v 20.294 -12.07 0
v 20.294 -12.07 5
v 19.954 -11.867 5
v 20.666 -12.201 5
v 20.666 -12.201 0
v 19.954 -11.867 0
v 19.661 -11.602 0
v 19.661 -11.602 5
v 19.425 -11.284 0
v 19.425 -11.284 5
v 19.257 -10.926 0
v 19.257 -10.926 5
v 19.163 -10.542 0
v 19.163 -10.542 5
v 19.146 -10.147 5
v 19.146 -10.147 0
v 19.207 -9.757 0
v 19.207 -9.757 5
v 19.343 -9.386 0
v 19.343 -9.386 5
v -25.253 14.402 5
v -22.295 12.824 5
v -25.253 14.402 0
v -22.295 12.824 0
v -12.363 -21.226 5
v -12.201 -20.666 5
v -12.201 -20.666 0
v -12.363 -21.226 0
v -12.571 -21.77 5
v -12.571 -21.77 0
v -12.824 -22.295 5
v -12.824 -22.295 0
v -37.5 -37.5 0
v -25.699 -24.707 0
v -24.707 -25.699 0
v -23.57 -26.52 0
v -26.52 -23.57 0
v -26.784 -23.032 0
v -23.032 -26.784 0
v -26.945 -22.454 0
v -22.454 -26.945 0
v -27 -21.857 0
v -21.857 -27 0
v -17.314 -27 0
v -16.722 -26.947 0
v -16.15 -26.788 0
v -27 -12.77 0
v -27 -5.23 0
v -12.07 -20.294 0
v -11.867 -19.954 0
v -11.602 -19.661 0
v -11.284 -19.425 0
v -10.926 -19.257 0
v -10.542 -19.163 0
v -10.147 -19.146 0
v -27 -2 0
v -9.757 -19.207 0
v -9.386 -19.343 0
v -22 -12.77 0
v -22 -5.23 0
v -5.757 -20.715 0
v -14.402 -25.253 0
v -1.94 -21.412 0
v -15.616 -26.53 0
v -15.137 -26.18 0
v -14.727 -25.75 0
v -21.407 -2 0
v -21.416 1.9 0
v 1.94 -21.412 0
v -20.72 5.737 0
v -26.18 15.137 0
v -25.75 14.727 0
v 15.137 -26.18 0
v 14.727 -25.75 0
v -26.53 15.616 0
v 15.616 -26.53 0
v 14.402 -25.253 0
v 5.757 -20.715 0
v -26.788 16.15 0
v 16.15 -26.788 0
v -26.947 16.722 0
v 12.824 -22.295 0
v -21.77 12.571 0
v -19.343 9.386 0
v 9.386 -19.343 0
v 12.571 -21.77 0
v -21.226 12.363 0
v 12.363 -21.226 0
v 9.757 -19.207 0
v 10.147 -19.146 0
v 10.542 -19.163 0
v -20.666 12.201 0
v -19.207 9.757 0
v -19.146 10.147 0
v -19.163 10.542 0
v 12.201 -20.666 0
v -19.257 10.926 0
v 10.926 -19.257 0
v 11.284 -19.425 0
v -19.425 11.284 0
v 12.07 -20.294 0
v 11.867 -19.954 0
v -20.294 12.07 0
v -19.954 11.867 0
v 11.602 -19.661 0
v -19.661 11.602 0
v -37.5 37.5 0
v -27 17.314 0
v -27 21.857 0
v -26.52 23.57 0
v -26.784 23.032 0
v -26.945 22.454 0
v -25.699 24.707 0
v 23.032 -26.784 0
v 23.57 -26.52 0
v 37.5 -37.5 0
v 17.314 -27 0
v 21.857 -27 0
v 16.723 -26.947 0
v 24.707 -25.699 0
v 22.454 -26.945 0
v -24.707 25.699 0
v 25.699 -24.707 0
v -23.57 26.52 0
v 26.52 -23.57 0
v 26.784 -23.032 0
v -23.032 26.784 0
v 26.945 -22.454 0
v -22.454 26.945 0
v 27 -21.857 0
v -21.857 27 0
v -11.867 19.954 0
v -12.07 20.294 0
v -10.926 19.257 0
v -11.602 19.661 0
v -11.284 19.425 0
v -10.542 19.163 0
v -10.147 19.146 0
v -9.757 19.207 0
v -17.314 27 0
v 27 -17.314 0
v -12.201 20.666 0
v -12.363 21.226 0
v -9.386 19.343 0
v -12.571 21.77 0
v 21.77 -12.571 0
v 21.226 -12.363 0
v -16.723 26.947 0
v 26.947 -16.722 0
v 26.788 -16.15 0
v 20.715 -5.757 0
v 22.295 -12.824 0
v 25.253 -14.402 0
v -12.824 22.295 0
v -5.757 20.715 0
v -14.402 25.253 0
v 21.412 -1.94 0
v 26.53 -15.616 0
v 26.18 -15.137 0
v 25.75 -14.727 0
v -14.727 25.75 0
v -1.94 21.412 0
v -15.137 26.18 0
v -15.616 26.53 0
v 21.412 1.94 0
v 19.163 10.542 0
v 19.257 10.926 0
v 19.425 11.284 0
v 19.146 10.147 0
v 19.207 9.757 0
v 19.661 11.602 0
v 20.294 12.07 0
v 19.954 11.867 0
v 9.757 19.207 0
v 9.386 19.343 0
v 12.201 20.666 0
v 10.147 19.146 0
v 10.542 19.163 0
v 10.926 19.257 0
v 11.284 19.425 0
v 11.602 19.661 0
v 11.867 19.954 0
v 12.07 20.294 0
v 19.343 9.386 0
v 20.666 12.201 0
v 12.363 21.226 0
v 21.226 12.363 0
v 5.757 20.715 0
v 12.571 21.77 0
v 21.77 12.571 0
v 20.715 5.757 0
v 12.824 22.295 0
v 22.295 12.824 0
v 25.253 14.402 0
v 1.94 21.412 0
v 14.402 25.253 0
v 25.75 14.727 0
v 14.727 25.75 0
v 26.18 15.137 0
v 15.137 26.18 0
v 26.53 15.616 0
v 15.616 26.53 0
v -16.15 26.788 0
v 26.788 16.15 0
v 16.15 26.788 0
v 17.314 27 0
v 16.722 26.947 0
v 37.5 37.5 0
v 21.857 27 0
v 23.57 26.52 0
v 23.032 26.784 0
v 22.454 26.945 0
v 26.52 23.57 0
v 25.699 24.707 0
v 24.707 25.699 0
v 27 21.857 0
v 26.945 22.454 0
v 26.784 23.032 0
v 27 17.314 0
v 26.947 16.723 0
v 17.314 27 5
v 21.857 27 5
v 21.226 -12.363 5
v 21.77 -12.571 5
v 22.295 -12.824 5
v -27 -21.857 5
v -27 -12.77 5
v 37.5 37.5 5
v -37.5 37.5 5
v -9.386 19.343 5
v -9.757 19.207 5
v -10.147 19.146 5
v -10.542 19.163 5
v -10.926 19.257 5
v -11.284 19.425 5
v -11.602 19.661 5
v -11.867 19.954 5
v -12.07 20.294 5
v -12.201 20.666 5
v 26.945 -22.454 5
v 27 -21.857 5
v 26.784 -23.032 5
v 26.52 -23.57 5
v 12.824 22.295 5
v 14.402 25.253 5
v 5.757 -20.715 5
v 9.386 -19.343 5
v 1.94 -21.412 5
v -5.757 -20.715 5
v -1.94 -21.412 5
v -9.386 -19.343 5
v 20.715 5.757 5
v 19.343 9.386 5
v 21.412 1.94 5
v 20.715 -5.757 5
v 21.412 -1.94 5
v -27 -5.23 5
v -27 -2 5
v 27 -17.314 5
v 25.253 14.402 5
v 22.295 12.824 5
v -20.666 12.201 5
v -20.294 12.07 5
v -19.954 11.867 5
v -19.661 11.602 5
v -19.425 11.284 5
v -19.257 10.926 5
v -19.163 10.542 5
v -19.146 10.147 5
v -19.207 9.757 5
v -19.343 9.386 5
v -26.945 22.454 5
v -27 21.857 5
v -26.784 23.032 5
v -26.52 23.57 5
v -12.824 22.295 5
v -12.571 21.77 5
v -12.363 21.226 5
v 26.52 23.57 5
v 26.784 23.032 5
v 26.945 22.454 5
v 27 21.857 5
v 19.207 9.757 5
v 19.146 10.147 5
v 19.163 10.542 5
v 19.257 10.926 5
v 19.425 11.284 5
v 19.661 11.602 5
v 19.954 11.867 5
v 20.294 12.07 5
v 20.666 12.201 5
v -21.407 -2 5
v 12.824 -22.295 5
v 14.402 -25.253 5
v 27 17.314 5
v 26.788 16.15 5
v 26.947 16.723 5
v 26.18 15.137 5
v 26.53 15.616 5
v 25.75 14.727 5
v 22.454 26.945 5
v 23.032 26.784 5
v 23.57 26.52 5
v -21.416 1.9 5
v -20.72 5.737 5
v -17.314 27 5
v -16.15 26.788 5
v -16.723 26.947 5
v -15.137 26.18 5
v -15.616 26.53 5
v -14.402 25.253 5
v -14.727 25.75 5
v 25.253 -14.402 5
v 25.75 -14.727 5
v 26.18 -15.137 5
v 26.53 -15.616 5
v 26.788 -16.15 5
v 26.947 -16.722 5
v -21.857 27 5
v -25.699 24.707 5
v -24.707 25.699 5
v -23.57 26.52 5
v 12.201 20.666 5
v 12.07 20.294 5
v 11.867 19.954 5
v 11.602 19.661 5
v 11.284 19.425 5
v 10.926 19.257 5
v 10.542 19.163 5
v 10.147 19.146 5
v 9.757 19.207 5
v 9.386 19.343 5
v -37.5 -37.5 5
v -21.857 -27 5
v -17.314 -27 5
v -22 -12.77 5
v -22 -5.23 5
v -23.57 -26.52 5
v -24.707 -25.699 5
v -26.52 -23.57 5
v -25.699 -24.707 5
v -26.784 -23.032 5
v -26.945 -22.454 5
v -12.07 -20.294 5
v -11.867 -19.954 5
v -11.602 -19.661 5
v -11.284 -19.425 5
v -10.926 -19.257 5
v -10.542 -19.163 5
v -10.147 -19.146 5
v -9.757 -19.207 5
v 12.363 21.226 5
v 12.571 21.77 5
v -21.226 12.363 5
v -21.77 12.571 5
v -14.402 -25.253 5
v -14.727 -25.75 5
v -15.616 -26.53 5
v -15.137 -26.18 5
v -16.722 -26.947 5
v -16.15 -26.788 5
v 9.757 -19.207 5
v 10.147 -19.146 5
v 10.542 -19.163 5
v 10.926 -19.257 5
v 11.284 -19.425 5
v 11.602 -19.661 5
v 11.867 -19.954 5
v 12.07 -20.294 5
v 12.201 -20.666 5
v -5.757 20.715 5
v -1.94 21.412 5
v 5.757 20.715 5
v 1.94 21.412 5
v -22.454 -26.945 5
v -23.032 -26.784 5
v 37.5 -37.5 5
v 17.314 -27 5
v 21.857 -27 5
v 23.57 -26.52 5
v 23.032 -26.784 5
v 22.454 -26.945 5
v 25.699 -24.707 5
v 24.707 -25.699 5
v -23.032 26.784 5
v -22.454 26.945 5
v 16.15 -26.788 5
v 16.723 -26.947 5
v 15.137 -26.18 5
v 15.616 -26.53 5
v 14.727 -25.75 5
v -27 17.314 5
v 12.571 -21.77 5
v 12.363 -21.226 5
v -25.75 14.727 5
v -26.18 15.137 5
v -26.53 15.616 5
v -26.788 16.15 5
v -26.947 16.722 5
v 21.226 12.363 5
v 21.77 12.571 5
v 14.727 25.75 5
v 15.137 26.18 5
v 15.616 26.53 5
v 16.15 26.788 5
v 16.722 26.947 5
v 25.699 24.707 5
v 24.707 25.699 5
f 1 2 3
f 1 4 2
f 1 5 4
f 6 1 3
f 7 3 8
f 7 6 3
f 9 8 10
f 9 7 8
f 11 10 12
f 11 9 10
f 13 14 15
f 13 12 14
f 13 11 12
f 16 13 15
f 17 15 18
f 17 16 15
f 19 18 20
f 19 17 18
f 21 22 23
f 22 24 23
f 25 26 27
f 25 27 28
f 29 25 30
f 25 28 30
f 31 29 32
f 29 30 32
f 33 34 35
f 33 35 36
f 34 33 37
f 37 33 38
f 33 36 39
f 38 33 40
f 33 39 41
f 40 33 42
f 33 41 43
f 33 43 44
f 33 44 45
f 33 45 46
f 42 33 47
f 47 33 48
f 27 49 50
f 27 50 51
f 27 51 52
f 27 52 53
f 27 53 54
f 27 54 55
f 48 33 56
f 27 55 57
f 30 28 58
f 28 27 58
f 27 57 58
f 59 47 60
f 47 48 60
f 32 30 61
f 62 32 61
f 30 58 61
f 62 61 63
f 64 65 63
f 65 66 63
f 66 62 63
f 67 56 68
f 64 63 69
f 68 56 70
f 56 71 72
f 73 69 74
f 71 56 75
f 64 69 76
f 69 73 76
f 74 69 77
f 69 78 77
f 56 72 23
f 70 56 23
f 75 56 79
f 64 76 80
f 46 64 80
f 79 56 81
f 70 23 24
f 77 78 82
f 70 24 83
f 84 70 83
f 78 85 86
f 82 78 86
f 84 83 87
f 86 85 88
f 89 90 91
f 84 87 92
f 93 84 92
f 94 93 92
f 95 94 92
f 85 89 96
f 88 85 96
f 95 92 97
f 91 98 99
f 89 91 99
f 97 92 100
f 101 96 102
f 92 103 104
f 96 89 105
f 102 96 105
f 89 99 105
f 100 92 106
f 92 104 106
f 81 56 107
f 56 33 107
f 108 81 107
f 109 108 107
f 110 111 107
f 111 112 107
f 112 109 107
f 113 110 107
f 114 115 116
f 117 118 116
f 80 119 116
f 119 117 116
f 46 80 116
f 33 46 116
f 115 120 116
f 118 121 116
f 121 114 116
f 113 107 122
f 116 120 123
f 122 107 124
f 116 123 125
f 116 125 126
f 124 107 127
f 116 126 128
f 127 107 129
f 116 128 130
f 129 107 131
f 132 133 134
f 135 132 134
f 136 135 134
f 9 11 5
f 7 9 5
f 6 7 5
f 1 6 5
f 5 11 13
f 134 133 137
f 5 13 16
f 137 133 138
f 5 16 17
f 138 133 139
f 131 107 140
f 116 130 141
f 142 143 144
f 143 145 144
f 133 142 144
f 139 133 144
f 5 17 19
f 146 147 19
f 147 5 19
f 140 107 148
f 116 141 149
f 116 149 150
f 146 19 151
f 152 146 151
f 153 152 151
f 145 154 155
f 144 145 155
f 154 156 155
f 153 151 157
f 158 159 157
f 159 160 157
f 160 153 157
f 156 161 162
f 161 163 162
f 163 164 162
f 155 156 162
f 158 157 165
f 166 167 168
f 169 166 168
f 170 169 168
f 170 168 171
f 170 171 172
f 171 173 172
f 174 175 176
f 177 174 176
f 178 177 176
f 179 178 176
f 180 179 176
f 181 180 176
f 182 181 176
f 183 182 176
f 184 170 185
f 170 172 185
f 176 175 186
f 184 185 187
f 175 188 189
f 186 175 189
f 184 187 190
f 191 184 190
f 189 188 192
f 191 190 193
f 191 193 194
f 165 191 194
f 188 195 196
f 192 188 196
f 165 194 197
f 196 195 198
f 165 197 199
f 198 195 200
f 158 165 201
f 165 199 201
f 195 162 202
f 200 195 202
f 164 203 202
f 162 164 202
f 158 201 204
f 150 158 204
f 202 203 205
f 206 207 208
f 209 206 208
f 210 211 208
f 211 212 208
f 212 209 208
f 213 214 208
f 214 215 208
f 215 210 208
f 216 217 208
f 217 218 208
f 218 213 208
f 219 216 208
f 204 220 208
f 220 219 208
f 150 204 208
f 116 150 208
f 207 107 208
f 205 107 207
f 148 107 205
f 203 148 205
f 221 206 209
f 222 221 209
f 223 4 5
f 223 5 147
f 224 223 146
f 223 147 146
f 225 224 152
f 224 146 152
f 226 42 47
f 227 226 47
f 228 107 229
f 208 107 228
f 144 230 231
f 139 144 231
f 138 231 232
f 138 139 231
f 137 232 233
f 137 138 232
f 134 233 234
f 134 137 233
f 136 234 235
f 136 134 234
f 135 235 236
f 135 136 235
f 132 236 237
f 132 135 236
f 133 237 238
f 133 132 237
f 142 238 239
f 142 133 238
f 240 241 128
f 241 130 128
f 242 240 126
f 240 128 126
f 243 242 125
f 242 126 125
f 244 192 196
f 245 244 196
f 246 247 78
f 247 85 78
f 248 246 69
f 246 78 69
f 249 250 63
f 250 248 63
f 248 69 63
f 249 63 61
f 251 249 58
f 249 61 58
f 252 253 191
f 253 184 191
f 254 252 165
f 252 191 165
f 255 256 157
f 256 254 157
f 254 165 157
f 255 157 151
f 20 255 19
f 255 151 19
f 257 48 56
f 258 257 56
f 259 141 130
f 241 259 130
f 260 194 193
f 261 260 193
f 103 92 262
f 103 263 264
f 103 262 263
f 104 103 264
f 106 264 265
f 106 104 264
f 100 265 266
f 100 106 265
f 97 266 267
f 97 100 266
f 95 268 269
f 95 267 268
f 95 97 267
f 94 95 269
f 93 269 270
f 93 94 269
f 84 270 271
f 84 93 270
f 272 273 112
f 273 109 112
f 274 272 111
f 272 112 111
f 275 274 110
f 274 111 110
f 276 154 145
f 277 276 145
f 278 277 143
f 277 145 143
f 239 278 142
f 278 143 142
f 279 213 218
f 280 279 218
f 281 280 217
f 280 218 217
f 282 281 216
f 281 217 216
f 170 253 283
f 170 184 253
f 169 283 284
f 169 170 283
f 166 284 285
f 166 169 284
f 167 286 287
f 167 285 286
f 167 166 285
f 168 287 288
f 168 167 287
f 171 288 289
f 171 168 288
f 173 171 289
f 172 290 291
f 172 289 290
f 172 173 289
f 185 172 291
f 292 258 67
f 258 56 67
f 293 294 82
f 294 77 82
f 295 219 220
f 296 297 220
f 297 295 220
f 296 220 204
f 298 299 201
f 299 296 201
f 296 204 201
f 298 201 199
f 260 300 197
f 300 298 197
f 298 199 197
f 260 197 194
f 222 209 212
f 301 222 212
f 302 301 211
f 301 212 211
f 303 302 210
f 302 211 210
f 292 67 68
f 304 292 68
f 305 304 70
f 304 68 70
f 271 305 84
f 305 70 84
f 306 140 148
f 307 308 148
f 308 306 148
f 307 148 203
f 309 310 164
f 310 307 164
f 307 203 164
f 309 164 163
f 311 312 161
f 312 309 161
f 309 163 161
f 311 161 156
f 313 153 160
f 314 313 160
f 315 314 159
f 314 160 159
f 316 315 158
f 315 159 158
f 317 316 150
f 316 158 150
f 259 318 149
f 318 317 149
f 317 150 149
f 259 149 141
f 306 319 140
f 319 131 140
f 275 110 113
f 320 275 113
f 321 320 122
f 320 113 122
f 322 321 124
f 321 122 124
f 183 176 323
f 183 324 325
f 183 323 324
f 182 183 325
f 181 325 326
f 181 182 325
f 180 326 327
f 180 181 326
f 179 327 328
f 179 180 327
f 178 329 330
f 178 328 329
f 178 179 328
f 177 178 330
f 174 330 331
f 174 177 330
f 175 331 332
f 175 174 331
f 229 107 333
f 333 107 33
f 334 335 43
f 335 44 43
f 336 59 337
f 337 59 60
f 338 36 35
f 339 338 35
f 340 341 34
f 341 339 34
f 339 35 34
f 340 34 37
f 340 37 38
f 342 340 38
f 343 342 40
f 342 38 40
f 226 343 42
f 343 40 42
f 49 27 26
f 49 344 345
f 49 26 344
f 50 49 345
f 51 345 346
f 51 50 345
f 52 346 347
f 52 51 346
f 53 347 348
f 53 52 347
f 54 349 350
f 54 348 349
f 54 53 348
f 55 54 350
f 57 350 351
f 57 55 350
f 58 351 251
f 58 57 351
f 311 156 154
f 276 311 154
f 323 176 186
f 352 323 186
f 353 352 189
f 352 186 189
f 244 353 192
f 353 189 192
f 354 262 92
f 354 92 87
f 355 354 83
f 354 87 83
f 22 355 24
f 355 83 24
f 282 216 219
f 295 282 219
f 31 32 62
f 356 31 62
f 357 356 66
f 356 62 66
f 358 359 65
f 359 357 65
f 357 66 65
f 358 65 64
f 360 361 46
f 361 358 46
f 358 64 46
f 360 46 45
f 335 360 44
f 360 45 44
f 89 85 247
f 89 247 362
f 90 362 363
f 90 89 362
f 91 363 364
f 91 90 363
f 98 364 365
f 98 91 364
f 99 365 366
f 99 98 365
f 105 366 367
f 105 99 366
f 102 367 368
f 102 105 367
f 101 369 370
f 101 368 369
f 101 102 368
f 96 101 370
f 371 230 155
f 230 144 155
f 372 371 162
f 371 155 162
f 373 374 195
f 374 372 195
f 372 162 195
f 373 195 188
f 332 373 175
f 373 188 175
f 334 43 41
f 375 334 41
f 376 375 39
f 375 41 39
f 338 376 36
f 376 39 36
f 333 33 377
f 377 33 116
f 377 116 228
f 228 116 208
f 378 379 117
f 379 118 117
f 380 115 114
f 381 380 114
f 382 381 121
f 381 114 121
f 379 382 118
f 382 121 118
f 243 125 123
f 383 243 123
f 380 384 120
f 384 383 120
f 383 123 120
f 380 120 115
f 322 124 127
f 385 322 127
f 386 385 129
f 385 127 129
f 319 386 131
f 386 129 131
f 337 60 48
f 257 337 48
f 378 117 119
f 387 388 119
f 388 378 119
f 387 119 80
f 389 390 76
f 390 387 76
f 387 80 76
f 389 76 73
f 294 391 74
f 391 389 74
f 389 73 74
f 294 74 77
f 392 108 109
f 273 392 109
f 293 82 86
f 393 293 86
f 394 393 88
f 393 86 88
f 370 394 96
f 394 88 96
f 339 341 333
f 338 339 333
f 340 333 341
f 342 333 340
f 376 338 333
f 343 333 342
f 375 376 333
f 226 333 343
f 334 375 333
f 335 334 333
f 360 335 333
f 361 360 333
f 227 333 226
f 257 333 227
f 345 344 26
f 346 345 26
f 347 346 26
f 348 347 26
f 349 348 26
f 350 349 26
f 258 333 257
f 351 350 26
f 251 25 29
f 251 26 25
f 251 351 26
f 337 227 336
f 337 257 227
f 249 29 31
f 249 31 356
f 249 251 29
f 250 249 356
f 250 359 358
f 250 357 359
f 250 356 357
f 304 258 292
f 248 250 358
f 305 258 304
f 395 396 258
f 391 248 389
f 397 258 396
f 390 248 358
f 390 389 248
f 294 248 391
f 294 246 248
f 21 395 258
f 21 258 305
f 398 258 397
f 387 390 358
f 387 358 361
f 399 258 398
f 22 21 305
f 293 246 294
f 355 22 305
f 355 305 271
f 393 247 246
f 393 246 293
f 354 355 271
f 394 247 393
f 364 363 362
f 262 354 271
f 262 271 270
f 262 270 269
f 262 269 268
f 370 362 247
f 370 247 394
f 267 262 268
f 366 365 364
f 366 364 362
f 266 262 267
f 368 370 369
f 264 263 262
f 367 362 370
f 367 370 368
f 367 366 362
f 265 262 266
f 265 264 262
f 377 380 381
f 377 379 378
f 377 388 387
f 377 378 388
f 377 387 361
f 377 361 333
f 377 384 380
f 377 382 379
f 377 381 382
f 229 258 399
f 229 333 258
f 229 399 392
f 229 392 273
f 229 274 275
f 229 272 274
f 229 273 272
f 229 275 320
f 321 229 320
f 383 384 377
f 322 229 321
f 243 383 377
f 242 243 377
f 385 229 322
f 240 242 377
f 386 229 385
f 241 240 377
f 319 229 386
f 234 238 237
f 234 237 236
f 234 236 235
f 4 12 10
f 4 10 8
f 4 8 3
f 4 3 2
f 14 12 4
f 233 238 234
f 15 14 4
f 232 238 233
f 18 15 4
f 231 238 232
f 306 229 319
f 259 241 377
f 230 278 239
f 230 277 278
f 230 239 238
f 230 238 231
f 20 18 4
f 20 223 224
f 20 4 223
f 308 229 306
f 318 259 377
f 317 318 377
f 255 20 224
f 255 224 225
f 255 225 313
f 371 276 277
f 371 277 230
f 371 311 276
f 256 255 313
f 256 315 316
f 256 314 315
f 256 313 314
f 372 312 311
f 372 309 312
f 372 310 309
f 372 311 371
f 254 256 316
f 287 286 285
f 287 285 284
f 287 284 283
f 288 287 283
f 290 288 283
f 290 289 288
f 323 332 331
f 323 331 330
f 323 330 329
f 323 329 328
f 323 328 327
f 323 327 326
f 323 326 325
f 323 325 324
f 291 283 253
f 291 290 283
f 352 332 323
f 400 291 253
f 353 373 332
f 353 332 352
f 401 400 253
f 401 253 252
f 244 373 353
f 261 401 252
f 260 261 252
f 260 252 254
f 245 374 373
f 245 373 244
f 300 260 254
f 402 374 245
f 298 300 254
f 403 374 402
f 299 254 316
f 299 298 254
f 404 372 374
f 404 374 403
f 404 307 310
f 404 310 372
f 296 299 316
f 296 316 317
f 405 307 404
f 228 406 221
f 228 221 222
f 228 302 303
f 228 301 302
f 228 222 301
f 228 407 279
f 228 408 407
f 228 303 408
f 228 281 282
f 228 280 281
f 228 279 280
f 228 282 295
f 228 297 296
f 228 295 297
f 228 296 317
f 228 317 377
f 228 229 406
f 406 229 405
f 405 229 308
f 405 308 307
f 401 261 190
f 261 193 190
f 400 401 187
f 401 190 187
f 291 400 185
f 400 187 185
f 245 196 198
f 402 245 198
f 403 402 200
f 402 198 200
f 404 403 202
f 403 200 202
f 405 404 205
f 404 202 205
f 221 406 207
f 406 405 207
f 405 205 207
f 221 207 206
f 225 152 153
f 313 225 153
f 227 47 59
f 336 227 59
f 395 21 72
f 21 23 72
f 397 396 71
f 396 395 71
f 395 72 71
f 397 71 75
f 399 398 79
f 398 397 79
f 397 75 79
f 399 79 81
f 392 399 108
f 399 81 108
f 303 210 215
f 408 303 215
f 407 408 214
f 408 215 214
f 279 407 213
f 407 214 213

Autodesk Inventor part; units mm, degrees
ref_plane "YZ Plane" through (0, 0, 0) normal (1, 0, 0) x (0, 1, 0)
ref_plane "XZ Plane" through (0, 0, 0) normal (0, 1, 0) x (-1, 0, 0)
ref_plane "XY Plane" through (0, 0, 0) normal (0, 0, 1) x (1, 0, 0)
ref_plane "Work Plane1" through (0, 0, 0) normal (0, 0, 1) x (1, 0, 0)
sketch "Sketch1" plane through (0, 0, 0) normal (0, 0, 1) x (1, 0, 0)
  circle A0 centre (0, 0) radius 8
  arc A1 (-21.8566, 27) -> (-23.5705, 26.52) centre (-21.8566, 23.7) ccw
  line L0 (-21.8566, 27) -> (-17.3137, 27)
  arc A2 (-14.4021, 25.2532) -> (-17.3137, 27) centre (-17.3137, 23.7) ccw
  line L1 (-14.4021, 25.2532) -> (-12.8239, 22.2947)
  arc A3 (-12.2013, 20.6664) -> (-12.8239, 22.2947) centre (-19, 19) ccw
  arc A4 (-12.2013, 20.6664) -> (-9.3857, 19.3432) centre (-10.2588, 21.1426) ccw
  arc A5 (9.3857, 19.3432) -> (-9.3857, 19.3432) centre (0, 0) ccw
  arc A6 (9.3857, 19.3432) -> (12.2013, 20.6664) centre (10.2588, 21.1426) ccw
  arc A7 (12.8239, 22.2947) -> (12.2013, 20.6664) centre (19, 19) ccw
  line L2 (12.8239, 22.2947) -> (14.4021, 25.2532)
  arc A8 (17.3137, 27) -> (14.4021, 25.2532) centre (17.3137, 23.7) ccw
  line L3 (17.3137, 27) -> (21.8566, 27)
  arc A9 (23.5705, 26.52) -> (21.8566, 27) centre (21.8566, 23.7) ccw
  arc A10 (26.52, 23.5705) -> (23.5705, 26.52) centre (19, 19) ccw
  arc A11 (27, 21.8566) -> (26.52, 23.5705) centre (23.7, 21.8566) ccw
  line L4 (27, 21.8566) -> (27, 17.3137)
  arc A12 (25.2532, 14.4021) -> (27, 17.3137) centre (23.7, 17.3137) ccw
  line L5 (25.2532, 14.4021) -> (22.2947, 12.8239)
  arc A13 (20.6664, 12.2013) -> (22.2947, 12.8239) centre (19, 19) ccw
  arc A14 (20.6664, 12.2013) -> (19.3432, 9.3857) centre (21.1426, 10.2588) ccw
  arc A15 (19.3432, -9.3857) -> (19.3432, 9.3857) centre (0, 0) ccw
  arc A16 (19.3432, -9.3857) -> (20.6664, -12.2013) centre (21.1426, -10.2588) ccw
  arc A17 (22.2947, -12.8239) -> (20.6664, -12.2013) centre (19, -19) ccw
  line L6 (22.2947, -12.8239) -> (25.2532, -14.4021)
  arc A18 (27, -17.3137) -> (25.2532, -14.4021) centre (23.7, -17.3137) ccw
  line L7 (27, -17.3137) -> (27, -21.8566)
  arc A19 (26.52, -23.5705) -> (27, -21.8566) centre (23.7, -21.8566) ccw
  arc A20 (23.5705, -26.52) -> (26.52, -23.5705) centre (19, -19) ccw
  arc A21 (21.8566, -27) -> (23.5705, -26.52) centre (21.8566, -23.7) ccw
  line L8 (21.8566, -27) -> (17.3137, -27)
  arc A22 (14.4021, -25.2532) -> (17.3137, -27) centre (17.3137, -23.7) ccw
  line L9 (14.4021, -25.2532) -> (12.8239, -22.2947)
  arc A23 (12.2013, -20.6664) -> (12.8239, -22.2947) centre (19, -19) ccw
  arc A24 (12.2013, -20.6664) -> (9.3857, -19.3432) centre (10.2588, -21.1426) ccw
  arc A25 (-9.3857, -19.3432) -> (9.3857, -19.3432) centre (0, 0) ccw
  arc A26 (-9.3857, -19.3432) -> (-12.2013, -20.6664) centre (-10.2588, -21.1426) ccw
  arc A27 (-12.8239, -22.2947) -> (-12.2013, -20.6664) centre (-19, -19) ccw
  line L10 (-12.8239, -22.2947) -> (-14.4021, -25.2532)
  arc A28 (-17.3137, -27) -> (-14.4021, -25.2532) centre (-17.3137, -23.7) ccw
  line L11 (-17.3137, -27) -> (-21.8566, -27)
  arc A29 (-23.5705, -26.52) -> (-21.8566, -27) centre (-21.8566, -23.7) ccw
  arc A30 (-26.52, -23.5705) -> (-23.5705, -26.52) centre (-19, -19) ccw
  arc A31 (-27, -21.8566) -> (-26.52, -23.5705) centre (-23.7, -21.8566) ccw
  line L12 (-27, -21.8566) -> (-27, -12.7696)
  line L13 (-27, -12.7696) -> (-22, -12.7696)
  line L14 (-22, -12.7696) -> (-22, -5.2304)
  line L15 (-22, -5.2304) -> (-27, -5.2304)
  line L16 (-27, -5.2304) -> (-27, -2)
  line L17 (-27, -2) -> (-21.4068, -2)
  arc A32 (-19.3432, 9.3857) -> (-21.4068, -2) centre (0, 0) ccw
  arc A33 (-19.3432, 9.3857) -> (-20.6664, 12.2013) centre (-21.1426, 10.2588) ccw
  arc A34 (-22.2947, 12.8239) -> (-20.6664, 12.2013) centre (-19, 19) ccw
  line L18 (-22.2947, 12.8239) -> (-25.2532, 14.4021)
  arc A35 (-27, 17.3137) -> (-25.2532, 14.4021) centre (-23.7, 17.3137) ccw
  line L19 (-27, 17.3137) -> (-27, 21.8566)
  arc A36 (-26.52, 23.5705) -> (-27, 21.8566) centre (-23.7, 21.8566) ccw
  arc A37 (-23.5705, 26.52) -> (-26.52, 23.5705) centre (-19, 19) ccw
  line L20 (42.5, 37.5) -> (42.5, -37.5)
  line L21 (42.5, -37.5) -> (37.5, -37.5)
  line L22 (37.5, -37.5) -> (37.5, 37.5)
  line L23 (37.5, 37.5) -> (42.5, 37.5)
  line L24 (-42.5, -37.5) -> (-42.5, 37.5)
  line L25 (-42.5, 37.5) -> (-37.5, 37.5)
  line L26 (-37.5, 37.5) -> (-37.5, -37.5)
  line L27 (-37.5, -37.5) -> (-42.5, -37.5)
  line L28 (-37.5, -37.5) -> (37.5, -37.5)
  line L29 (-37.5, 37.5) -> (37.5, 37.5)
  point P0 (0, 0)
extrude "Extrusion1" add sketch "Sketch1" along normal blind 5 contours L22 L28 L26 L29
properties part number "Soporte Cilindro Cortadora"
